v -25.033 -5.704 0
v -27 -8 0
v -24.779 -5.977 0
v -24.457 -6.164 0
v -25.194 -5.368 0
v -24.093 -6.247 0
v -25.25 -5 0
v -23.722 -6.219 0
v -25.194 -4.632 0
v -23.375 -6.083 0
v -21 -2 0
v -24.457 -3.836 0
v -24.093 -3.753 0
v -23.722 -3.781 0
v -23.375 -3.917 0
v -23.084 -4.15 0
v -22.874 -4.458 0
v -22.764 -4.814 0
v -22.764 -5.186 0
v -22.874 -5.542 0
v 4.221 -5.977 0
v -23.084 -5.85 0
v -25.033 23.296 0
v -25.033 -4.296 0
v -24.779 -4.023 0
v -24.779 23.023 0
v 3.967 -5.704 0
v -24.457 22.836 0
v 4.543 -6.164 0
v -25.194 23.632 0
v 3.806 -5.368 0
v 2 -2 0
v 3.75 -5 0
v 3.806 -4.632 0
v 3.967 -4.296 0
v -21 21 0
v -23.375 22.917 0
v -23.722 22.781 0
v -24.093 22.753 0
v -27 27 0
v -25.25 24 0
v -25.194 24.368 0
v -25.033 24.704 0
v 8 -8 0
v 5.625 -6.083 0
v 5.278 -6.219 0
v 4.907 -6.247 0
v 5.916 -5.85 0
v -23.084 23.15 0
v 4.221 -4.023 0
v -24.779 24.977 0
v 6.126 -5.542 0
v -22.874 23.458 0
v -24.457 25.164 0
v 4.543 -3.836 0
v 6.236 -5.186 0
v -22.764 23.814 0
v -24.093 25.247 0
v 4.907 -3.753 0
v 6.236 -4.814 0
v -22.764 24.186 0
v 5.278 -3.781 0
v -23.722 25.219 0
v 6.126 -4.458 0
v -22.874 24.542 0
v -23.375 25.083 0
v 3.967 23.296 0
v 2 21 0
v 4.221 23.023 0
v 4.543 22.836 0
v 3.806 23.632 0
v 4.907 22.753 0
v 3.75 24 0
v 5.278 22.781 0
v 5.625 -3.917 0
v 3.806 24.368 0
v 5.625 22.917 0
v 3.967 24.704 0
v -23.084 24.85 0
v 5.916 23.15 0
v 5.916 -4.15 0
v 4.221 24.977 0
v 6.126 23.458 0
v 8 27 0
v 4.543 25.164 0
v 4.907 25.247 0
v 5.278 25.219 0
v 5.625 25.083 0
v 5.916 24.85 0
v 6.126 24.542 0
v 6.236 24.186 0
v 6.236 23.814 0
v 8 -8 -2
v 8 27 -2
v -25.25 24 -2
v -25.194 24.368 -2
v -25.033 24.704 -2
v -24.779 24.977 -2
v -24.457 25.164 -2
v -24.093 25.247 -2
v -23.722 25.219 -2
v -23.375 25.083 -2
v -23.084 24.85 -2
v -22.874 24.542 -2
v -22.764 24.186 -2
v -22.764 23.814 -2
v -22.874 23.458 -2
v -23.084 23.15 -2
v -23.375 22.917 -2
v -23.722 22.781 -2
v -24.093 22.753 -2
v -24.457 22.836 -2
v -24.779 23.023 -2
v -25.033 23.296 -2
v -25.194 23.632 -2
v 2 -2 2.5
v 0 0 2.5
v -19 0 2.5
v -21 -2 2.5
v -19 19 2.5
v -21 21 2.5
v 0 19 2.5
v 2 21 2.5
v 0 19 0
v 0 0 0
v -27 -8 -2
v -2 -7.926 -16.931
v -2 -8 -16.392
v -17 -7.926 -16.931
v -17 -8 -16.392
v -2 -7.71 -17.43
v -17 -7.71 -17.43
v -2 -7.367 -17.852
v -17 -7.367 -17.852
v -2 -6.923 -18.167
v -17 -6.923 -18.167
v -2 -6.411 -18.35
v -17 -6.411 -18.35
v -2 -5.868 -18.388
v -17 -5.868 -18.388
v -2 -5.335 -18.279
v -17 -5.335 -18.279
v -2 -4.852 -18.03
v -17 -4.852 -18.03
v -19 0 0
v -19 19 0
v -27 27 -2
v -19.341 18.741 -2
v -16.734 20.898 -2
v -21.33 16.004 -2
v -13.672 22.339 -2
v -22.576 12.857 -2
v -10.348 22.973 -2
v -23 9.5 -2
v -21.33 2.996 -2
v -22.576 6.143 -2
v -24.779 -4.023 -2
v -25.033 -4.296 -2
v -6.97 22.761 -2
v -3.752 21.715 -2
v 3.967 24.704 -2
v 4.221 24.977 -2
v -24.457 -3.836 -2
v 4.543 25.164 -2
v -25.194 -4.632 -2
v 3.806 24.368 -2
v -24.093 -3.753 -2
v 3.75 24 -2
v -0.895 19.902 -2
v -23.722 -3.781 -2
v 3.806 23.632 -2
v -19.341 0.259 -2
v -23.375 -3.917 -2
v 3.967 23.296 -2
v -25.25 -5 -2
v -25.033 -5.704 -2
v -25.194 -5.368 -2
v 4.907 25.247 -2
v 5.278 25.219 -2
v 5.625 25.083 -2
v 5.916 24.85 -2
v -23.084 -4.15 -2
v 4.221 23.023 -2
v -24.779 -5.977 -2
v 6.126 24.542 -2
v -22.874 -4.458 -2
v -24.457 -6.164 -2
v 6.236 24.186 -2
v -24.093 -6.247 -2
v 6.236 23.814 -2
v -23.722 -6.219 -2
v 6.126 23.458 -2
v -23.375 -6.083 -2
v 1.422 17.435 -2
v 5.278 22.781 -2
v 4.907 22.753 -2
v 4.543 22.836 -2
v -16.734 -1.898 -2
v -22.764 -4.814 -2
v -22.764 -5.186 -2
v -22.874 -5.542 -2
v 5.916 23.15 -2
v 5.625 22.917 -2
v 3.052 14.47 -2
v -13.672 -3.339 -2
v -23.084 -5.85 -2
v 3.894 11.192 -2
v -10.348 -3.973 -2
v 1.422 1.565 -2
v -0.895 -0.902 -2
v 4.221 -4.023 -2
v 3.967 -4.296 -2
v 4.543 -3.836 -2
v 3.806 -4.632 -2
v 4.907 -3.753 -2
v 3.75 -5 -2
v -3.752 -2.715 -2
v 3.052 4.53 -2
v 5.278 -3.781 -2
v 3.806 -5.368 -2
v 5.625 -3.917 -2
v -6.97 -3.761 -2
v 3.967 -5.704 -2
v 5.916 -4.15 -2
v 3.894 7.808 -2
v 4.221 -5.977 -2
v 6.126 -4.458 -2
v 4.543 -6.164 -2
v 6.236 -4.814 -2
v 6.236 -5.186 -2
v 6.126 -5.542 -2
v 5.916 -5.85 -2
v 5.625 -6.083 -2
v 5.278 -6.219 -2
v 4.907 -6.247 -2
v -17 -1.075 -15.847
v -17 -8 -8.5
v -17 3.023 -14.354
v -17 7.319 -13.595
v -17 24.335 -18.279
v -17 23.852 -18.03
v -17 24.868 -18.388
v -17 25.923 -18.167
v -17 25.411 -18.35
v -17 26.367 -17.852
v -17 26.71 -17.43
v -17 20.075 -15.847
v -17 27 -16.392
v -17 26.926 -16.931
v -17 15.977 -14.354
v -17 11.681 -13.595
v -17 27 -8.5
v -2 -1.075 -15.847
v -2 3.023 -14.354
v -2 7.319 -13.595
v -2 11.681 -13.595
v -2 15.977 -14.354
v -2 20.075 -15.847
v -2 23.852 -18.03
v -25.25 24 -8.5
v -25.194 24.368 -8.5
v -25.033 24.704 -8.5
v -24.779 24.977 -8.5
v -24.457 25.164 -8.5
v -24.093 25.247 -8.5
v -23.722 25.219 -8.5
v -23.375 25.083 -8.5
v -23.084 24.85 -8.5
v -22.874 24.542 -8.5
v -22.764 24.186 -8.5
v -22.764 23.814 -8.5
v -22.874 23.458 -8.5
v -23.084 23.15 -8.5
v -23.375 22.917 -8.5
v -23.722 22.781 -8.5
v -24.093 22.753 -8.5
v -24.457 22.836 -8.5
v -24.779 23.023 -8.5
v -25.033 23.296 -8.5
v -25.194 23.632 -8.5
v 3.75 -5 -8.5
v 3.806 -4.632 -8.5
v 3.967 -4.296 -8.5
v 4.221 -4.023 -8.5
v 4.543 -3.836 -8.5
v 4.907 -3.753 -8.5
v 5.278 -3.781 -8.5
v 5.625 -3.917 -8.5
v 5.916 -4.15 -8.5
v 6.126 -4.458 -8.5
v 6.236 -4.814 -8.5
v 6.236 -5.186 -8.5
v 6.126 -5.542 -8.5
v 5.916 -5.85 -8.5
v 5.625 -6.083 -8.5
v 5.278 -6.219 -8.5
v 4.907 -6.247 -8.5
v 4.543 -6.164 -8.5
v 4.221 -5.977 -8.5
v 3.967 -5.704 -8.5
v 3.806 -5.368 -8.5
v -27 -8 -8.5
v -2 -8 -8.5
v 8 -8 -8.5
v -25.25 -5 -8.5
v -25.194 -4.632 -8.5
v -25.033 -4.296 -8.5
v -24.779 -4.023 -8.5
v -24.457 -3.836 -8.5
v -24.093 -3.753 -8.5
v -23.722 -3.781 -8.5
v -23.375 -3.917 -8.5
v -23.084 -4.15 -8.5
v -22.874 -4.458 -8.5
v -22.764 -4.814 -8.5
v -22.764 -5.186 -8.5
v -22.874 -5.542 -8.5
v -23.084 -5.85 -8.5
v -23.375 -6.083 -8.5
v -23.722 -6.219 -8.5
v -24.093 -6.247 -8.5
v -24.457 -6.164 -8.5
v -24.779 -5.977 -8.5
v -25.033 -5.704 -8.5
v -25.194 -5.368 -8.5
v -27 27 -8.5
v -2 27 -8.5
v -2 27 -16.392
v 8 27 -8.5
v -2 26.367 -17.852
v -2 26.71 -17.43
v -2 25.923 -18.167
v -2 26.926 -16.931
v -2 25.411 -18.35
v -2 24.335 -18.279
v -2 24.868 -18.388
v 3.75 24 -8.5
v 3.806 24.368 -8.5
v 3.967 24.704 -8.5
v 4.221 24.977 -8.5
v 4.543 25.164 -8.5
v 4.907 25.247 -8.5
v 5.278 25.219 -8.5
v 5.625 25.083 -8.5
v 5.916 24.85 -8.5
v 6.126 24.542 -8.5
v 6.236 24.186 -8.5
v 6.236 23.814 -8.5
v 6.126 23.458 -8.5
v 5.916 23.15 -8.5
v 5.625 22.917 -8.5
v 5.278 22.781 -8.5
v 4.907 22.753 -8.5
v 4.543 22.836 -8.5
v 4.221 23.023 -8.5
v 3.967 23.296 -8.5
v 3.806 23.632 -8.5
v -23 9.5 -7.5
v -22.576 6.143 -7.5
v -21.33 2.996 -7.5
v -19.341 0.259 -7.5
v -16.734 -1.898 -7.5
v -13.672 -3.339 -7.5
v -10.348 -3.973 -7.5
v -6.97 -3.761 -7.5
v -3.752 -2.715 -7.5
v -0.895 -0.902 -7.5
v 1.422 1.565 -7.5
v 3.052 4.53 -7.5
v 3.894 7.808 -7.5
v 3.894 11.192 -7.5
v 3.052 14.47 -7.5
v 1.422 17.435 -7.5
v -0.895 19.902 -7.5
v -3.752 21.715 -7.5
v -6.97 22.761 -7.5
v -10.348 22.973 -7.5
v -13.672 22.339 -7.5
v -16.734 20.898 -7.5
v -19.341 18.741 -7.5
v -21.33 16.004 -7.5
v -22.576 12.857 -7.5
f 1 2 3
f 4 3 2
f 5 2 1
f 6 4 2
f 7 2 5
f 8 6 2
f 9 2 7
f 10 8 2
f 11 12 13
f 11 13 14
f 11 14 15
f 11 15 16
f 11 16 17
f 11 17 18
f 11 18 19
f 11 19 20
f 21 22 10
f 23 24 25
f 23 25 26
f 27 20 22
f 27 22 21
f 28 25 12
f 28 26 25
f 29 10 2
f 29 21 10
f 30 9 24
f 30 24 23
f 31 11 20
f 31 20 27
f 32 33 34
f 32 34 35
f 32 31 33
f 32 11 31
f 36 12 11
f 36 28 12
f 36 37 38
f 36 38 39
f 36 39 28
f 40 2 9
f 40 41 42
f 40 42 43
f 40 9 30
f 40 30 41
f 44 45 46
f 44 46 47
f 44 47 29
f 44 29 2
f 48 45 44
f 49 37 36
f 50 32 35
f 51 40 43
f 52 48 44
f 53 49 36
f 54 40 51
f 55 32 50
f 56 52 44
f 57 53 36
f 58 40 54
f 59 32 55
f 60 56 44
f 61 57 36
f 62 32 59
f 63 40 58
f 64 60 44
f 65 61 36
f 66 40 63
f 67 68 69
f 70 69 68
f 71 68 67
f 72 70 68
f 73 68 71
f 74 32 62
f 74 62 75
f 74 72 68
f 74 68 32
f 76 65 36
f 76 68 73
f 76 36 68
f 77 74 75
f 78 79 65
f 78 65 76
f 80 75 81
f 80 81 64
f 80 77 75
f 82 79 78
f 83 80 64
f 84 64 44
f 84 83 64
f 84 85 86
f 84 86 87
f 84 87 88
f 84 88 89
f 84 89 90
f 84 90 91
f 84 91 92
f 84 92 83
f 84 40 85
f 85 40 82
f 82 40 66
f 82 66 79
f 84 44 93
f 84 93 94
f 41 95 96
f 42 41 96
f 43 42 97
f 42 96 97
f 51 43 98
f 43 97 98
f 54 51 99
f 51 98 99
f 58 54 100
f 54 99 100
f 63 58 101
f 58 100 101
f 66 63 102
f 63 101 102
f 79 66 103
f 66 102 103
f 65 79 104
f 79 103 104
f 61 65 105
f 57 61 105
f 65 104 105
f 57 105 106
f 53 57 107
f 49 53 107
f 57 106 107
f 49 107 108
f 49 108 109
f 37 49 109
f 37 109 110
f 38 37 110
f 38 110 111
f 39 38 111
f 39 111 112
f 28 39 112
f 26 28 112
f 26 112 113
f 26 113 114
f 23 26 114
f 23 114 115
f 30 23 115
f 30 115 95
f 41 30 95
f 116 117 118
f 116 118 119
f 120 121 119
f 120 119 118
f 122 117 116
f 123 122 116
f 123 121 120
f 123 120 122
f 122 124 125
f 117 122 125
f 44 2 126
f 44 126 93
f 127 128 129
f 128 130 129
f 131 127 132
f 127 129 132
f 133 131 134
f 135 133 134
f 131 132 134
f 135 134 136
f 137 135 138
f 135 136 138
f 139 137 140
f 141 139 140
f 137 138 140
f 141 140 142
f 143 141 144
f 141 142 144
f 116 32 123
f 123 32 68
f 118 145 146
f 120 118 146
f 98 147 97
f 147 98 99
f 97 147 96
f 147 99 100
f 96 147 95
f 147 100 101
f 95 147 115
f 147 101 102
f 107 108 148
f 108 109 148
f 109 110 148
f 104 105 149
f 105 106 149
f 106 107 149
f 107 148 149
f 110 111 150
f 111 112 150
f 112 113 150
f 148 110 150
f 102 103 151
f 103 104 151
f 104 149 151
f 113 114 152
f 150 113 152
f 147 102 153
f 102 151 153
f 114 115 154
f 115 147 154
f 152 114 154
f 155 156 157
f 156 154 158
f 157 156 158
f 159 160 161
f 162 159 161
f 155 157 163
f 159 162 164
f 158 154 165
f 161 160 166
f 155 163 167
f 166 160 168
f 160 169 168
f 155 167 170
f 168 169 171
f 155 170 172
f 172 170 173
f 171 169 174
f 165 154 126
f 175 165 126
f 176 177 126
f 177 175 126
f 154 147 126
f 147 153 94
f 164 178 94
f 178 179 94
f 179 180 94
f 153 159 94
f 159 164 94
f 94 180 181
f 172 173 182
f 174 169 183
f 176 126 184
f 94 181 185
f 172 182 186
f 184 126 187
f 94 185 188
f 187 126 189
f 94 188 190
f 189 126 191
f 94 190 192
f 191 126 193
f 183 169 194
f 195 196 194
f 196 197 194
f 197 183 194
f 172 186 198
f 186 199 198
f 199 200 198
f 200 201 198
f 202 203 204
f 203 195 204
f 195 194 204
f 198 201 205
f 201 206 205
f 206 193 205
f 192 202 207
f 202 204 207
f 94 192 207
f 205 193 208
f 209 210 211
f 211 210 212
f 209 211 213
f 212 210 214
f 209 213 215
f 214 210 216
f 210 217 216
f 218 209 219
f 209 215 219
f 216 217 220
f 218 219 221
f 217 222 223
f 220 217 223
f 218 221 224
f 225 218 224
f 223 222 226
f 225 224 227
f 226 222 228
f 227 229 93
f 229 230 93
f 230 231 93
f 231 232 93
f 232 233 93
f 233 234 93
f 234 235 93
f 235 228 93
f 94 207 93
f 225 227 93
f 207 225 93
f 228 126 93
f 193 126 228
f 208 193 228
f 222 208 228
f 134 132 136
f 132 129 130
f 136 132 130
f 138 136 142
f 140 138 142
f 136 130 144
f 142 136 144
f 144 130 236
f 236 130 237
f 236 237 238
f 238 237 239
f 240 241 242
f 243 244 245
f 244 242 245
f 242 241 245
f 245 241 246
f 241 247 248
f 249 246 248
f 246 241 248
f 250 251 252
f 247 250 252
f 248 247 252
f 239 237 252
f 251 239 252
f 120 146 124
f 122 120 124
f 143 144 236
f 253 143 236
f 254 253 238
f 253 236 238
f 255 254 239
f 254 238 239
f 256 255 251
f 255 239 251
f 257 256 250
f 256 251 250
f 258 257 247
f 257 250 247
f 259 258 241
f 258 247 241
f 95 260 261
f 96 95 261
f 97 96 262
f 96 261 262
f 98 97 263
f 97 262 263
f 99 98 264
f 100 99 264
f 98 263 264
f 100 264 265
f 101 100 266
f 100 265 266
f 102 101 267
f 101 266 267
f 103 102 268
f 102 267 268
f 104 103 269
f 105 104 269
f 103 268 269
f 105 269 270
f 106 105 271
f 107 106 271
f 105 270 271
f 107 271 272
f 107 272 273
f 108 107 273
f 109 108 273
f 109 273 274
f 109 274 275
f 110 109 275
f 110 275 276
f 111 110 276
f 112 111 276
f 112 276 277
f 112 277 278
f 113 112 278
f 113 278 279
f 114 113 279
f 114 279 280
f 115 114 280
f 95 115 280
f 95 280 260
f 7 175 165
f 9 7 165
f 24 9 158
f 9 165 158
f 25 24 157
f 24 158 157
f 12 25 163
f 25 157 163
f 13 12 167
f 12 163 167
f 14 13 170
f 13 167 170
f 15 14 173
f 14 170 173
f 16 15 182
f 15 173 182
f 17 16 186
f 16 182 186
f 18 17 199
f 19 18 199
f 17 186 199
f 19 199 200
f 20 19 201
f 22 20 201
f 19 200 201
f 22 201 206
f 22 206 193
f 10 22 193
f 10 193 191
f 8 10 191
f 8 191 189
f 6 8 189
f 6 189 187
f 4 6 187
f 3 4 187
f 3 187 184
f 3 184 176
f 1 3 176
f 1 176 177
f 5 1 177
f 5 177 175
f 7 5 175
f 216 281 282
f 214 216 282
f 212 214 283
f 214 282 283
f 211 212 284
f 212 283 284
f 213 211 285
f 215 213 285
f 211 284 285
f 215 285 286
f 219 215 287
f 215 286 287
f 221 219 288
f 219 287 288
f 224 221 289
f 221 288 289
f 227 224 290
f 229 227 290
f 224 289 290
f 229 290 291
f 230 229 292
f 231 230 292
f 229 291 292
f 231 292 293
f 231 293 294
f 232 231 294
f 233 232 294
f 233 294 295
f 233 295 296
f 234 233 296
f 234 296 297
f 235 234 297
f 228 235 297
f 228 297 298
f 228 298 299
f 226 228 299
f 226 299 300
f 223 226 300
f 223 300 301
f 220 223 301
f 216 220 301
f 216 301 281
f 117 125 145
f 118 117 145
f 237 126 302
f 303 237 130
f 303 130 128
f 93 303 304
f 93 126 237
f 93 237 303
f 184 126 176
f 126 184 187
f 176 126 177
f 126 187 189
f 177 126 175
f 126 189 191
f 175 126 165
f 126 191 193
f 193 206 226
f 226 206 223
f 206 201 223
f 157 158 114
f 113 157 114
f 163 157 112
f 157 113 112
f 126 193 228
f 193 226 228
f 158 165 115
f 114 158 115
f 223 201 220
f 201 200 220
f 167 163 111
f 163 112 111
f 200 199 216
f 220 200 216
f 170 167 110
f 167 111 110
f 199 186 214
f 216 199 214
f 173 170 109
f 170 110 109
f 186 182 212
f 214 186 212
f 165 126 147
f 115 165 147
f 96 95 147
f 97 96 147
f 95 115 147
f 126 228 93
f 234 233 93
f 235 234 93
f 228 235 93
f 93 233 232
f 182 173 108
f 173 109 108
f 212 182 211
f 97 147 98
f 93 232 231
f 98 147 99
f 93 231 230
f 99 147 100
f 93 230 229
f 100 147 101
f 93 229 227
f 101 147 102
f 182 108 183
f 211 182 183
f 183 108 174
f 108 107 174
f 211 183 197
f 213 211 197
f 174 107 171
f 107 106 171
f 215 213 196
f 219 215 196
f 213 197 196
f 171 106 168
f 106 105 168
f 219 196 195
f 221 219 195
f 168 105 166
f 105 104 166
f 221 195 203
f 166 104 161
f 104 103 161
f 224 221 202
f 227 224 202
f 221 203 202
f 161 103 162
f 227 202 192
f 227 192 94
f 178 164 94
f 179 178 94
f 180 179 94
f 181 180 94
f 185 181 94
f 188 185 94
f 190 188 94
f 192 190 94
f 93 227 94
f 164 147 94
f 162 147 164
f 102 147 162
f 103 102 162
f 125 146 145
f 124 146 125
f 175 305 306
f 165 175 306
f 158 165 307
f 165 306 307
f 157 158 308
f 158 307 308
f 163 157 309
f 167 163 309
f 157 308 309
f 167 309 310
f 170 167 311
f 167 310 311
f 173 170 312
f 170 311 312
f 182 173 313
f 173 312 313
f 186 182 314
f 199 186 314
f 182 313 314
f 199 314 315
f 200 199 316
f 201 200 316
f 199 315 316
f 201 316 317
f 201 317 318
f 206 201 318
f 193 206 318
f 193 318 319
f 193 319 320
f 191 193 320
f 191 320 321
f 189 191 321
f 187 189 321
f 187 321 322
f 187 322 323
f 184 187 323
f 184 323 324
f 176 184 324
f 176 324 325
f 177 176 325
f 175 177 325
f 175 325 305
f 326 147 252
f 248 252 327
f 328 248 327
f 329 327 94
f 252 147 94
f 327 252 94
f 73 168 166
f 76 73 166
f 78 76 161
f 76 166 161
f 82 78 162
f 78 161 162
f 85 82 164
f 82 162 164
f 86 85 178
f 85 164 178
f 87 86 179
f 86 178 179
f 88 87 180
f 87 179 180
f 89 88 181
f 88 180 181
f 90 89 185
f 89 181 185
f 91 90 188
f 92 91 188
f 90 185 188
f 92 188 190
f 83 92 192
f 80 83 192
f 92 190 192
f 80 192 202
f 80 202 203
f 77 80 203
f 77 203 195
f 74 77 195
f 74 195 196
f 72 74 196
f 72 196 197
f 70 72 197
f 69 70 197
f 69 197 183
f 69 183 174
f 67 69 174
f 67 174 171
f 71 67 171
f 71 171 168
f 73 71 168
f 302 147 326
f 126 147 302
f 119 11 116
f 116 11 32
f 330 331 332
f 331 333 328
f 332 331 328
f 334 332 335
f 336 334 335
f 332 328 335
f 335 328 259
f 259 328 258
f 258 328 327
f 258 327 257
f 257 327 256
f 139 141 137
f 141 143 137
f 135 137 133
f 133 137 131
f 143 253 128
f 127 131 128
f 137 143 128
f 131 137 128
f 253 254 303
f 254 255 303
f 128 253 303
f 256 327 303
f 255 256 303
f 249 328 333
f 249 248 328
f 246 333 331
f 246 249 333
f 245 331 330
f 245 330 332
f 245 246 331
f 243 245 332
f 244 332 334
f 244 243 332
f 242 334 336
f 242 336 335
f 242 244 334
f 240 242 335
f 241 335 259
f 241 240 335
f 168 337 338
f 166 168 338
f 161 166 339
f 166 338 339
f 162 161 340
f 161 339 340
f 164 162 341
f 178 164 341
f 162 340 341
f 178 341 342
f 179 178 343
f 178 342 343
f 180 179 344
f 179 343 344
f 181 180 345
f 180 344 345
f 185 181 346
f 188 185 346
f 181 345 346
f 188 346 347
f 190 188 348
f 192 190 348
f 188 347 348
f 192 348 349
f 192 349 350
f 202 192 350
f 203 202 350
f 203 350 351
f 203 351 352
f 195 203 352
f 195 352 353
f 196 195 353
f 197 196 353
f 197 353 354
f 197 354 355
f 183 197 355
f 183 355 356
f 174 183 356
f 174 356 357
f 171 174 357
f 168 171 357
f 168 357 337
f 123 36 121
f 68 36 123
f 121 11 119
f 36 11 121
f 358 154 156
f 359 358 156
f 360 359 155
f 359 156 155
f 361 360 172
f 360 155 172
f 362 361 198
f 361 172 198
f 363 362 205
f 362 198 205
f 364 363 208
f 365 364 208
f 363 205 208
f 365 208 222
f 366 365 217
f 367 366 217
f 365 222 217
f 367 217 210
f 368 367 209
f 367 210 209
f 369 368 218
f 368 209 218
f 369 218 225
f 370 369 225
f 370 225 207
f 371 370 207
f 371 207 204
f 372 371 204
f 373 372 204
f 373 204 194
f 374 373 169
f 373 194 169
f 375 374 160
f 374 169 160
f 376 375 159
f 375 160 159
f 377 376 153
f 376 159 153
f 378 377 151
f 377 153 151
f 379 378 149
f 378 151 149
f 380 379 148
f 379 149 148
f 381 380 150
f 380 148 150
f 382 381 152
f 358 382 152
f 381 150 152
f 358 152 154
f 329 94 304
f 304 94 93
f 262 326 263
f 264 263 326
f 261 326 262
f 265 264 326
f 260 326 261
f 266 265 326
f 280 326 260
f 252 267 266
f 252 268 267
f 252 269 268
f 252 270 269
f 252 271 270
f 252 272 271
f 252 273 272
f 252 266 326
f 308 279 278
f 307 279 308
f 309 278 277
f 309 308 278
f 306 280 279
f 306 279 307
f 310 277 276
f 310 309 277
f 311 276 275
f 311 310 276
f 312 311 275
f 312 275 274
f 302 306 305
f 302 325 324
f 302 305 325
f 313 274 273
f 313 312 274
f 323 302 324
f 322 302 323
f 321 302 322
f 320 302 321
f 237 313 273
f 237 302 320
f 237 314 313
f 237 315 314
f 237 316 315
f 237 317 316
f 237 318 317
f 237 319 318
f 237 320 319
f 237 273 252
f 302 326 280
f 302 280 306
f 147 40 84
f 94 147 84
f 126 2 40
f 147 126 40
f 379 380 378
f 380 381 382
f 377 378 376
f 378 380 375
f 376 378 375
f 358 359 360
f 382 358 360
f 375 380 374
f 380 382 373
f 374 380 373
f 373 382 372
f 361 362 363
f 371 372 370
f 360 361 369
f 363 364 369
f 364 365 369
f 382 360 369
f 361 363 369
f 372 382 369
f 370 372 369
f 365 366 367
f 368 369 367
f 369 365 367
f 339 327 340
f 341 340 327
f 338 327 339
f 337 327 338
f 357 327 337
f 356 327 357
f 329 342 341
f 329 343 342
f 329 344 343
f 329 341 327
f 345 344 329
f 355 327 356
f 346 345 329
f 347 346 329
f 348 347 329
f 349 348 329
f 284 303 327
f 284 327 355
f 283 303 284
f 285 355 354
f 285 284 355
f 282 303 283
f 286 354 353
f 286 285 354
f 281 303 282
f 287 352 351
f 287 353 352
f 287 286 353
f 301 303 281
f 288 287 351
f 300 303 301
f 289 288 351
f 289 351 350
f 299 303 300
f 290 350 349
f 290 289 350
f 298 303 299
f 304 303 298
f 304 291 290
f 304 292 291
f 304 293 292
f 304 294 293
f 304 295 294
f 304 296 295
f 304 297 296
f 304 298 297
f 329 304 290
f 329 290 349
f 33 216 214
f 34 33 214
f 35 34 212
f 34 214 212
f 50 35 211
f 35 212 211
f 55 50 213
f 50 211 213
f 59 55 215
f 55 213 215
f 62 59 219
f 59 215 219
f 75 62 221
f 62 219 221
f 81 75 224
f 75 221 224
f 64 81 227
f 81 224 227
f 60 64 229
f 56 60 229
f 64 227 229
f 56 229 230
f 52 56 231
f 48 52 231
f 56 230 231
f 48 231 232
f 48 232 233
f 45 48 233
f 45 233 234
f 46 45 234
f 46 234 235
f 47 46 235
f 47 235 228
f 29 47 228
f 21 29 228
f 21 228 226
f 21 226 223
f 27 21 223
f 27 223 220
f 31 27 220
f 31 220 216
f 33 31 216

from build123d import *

# Parameters (mm, degrees)
F0_W       = 35
F0_H       = 35
F0_W_2     = 23
F0_H_2     = 23
F1_DEPTH   = 2
F3_DEPTH   = 5.5
F4_DEPTH   = 2.5
F5_DEPTH   = 1
F7_W       = 35
F7_H       = 35
F7_R       = 13.5
F8_DEPTH   = 1
F9_D       = 2.5
F9_DEPTH   = 10
F9_TIP     = 0.7510757738
F9_2_D     = 2.5
F9_2_DEPTH = 10
F9_2_TIP   = 0.7510757738
F10_W      = 7.5
F10_H      = 17.5
F11_DEPTH  = 25
F12_R      = 25
F13_DEPTH  = 25
F14_R      = 2


with BuildPart() as f1:
    # F0 (on Top) → F1 (new body)
    with BuildSketch(Plane.XY):
        with Locations((-9.5, 9.5)):
            Rectangle(F0_W, F0_H)
        with Locations((-9.5, 9.5)):
            Rectangle(F0_W_2, F0_H_2, mode=Mode.SUBTRACT)
        with Locations((-9.5, 9.5)):
            Rectangle(F0_W_2, F0_H_2)
        with BuildLine():
            Line((0, 5.027864045), (0, 0))
            Line((0, 0), (-5.027864045, 0))
            ThreePointArc((-5.027864045, 0), (-9.5, -1), (-13.972135955, 0))
            Line((-13.972135955, 0), (-19, 0))
            Line((-19, 0), (-19, 5.027864045))
            ThreePointArc((-19, 5.027864045), (-20, 9.5), (-19, 13.972135955))
            Line((-19, 13.972135955), (-19, 19))
            Line((-19, 19), (-13.972135955, 19))
            ThreePointArc((-13.972135955, 19), (-9.5, 20), (-5.027864045, 19))
            Line((-5.027864045, 19), (0, 19))
            Line((0, 19), (0, 13.972135955))
            ThreePointArc((0, 13.972135955), (0.746950766, 11.7912878475), (1, 9.5))
            ThreePointArc((1, 9.5), (0.746950766, 7.2087121525), (0, 5.027864045))
        make_face(mode=Mode.SUBTRACT)
        with BuildLine():
            Line((-13.972135955, 0), (-5.027864045, 0))
            ThreePointArc((-5.027864045, 0), (-2.0753787975, 2.0753787975), (0, 5.027864045))
            Line((0, 5.027864045), (0, 13.972135955))
            ThreePointArc((0, 13.972135955), (-2.0753787975, 16.9246212025), (-5.027864045, 19))
            Line((-5.027864045, 19), (-13.972135955, 19))
            ThreePointArc((-13.972135955, 19), (-16.9246212025, 16.9246212025), (-19, 13.972135955))
            Line((-19, 13.972135955), (-19, 5.027864045))
            ThreePointArc((-19, 5.027864045), (-16.9246212025, 2.0753787975), (-13.972135955, 0))
        make_face()
        with BuildLine():
            Line((-19, 19), (-19, 13.972135955))
            ThreePointArc((-19, 13.972135955), (-16.9246212025, 16.9246212025), (-13.972135955, 19))
            Line((-13.972135955, 19), (-19, 19))
        make_face()
        with BuildLine():
            ThreePointArc((-5.027864045, 19), (-2.0753787975, 16.9246212025), (0, 13.972135955))
            Line((0, 13.972135955), (0, 19))
            Line((0, 19), (-5.027864045, 19))
        make_face()
        with BuildLine():
            Line((-5.027864045, 0), (0, 0))
            Line((0, 0), (0, 5.027864045))
            ThreePointArc((0, 5.027864045), (-2.0753787975, 2.0753787975), (-5.027864045, 0))
        make_face()
        with BuildLine():
            Line((-19, 0), (-13.972135955, 0))
            ThreePointArc((-13.972135955, 0), (-16.9246212025, 2.0753787975), (-19, 5.027864045))
            Line((-19, 5.027864045), (-19, 0))
        make_face()
        with BuildLine():
            Line((0, 13.972135955), (0, 5.027864045))
            ThreePointArc((0, 5.027864045), (0.746950766, 7.2087121525), (1, 9.5))
            ThreePointArc((1, 9.5), (0.746950766, 11.7912878475), (0, 13.972135955))
        make_face()
        with BuildLine():
            ThreePointArc((-13.972135955, 0), (-9.5, -1), (-5.027864045, 0))
            Line((-5.027864045, 0), (-13.972135955, 0))
        make_face()
        with BuildLine():
            ThreePointArc((-19, 13.972135955), (-20, 9.5), (-19, 5.027864045))
            Line((-19, 5.027864045), (-19, 13.972135955))
        make_face()
        with BuildLine():
            Line((-13.972135955, 19), (-5.027864045, 19))
            ThreePointArc((-5.027864045, 19), (-9.5, 20), (-13.972135955, 19))
        make_face()
    extrude(amount=-F1_DEPTH)

    # F0 (on Top) → F4 (join)
    with BuildSketch(Plane.XY):
        with Locations((-9.5, 9.5)):
            Rectangle(F0_W_2, F0_H_2)
        with BuildLine():
            Line((0, 5.027864045), (0, 0))
            Line((0, 0), (-5.027864045, 0))
            ThreePointArc((-5.027864045, 0), (-9.5, -1), (-13.972135955, 0))
            Line((-13.972135955, 0), (-19, 0))
            Line((-19, 0), (-19, 5.027864045))
            ThreePointArc((-19, 5.027864045), (-20, 9.5), (-19, 13.972135955))
            Line((-19, 13.972135955), (-19, 19))
            Line((-19, 19), (-13.972135955, 19))
            ThreePointArc((-13.972135955, 19), (-9.5, 20), (-5.027864045, 19))
            Line((-5.027864045, 19), (0, 19))
            Line((0, 19), (0, 13.972135955))
            ThreePointArc((0, 13.972135955), (0.746950766, 11.7912878475), (1, 9.5))
            ThreePointArc((1, 9.5), (0.746950766, 7.2087121525), (0, 5.027864045))
        make_face(mode=Mode.SUBTRACT)
        with BuildLine():
            ThreePointArc((-19, 13.972135955), (-20, 9.5), (-19, 5.027864045))
            Line((-19, 5.027864045), (-19, 13.972135955))
        make_face()
        with BuildLine():
            Line((-13.972135955, 19), (-5.027864045, 19))
            ThreePointArc((-5.027864045, 19), (-9.5, 20), (-13.972135955, 19))
        make_face()
        with BuildLine():
            Line((0, 13.972135955), (0, 5.027864045))
            ThreePointArc((0, 5.027864045), (0.746950766, 7.2087121525), (1, 9.5))
            ThreePointArc((1, 9.5), (0.746950766, 11.7912878475), (0, 13.972135955))
        make_face()
        with BuildLine():
            ThreePointArc((-13.972135955, 0), (-9.5, -1), (-5.027864045, 0))
            Line((-5.027864045, 0), (-13.972135955, 0))
        make_face()
    extrude(amount=F4_DEPTH)


with BuildPart() as f3:
    # F2 (on face) → F3 (new body)
    with BuildSketch(Plane(origin=(0, 0, -2), x_dir=(1, 0, 0), z_dir=(0, 0, -1))):
        with BuildLine():
            Line((-27, -9.5), (-27, -27))
            Line((-27, -27), (8, -27))
            Line((8, -27), (8, -9.5))
            Line((8, -9.5), (4, -9.5))
            ThreePointArc((4, -9.5), (-9.5, -23), (-23, -9.5))
            Line((-23, -9.5), (-27, -9.5))
        make_face()
        with BuildLine():
            Line((-27, 8), (-27, -9.5))
            Line((-27, -9.5), (-23, -9.5))
            ThreePointArc((-23, -9.5), (-9.5, 4), (4, -9.5))
            Line((4, -9.5), (8, -9.5))
            Line((8, -9.5), (8, 8))
            Line((8, 8), (-27, 8))
        make_face()
    extrude(amount=F3_DEPTH)


with BuildPart() as f5:
    # F5 (new): a face of the model
    f5_faces = [f3.part.faces().sort_by_distance(p)[0] for p in [
        (-9.5, 26.5050252532, -7.5),
    ]]
    extrude(f5_faces, amount=F5_DEPTH)


with BuildPart() as f5b:
    # F5#2 (new): a face of the model
    f5_2_faces = [f1.part.faces().sort_by_distance(p)[0] for p in [
        (-9.5, 9.5, -2),
    ]]
    extrude(f5_2_faces, amount=F5_DEPTH)


with BuildPart() as f3_1:
    add(f3.part)

    # F7 (on face) → F8 (join)
    with BuildSketch(Plane(origin=(0, 0, -7.5), x_dir=(1, 0, 0), z_dir=(0, 0, -1))):
        with Locations((-9.5, -9.5)):
            Rectangle(F7_W, F7_H)
        with Locations((-9.5, -9.5)):
            Circle(F7_R, mode=Mode.SUBTRACT)
        with Locations((-9.5, -9.5)):
            Circle(F7_R)
    extrude(amount=F8_DEPTH)

    # F9#2
    with Locations(Plane.XY):
        with Locations((-24, -5), (-24, 24), (5, 24), (5, -5)):
            Hole(F9_2_D / 2, depth=F9_2_DEPTH)
            with Locations((0, 0, -(F9_2_DEPTH + F9_2_TIP / 2))):  # 118° drill point
                Cone(0, F9_2_D / 2, F9_2_TIP, mode=Mode.SUBTRACT)

    # F10 (on face) → F11 (join)
    with BuildSketch(Plane(origin=(0, 0, -8.5), x_dir=(1, 0, 0), z_dir=(0, 0, -1))):
        with Locations((-13.25, -0.75)):
            Rectangle(F10_W, F10_H)
        with Locations((-13.25, -18.25)):
            Rectangle(F10_W, F10_H)
        Polygon((-2, 8), (-9.5, 8), (-9.5, -9.5), (-9.5, -27), (-2, -27), (-2, -9.5), align=None)
    extrude(amount=F11_DEPTH)

    # F12 (on face) → F13 (cut)
    with BuildSketch(Plane(origin=(-17, 0, 0), x_dir=(0, -1, 0), z_dir=(-1, 0, 0))):
        with Locations((-9.5, -38.5)):
            Circle(F12_R)
    extrude(amount=-F13_DEPTH, mode=Mode.SUBTRACT)

    # F14
    f14_edges = [f3_1.edges().sort_by_distance(p)[0] for p in [
        (-9.5, -8, -20.646429),
        (-9.5, 27, -20.646429),
    ]]
    fillet(f14_edges, radius=F14_R)


with BuildPart() as f1_1:
    add(f1.part)

    # F9
    with Locations(Plane.XY):
        with Locations((-24, -5), (-24, 24), (5, 24), (5, -5)):
            Hole(F9_D / 2, depth=F9_DEPTH)
            with Locations((0, 0, -(F9_DEPTH + F9_TIP / 2))):  # 118° drill point
                Cone(0, F9_D / 2, F9_TIP, mode=Mode.SUBTRACT)


solid = Compound([f3_1.part, f1_1.part])
